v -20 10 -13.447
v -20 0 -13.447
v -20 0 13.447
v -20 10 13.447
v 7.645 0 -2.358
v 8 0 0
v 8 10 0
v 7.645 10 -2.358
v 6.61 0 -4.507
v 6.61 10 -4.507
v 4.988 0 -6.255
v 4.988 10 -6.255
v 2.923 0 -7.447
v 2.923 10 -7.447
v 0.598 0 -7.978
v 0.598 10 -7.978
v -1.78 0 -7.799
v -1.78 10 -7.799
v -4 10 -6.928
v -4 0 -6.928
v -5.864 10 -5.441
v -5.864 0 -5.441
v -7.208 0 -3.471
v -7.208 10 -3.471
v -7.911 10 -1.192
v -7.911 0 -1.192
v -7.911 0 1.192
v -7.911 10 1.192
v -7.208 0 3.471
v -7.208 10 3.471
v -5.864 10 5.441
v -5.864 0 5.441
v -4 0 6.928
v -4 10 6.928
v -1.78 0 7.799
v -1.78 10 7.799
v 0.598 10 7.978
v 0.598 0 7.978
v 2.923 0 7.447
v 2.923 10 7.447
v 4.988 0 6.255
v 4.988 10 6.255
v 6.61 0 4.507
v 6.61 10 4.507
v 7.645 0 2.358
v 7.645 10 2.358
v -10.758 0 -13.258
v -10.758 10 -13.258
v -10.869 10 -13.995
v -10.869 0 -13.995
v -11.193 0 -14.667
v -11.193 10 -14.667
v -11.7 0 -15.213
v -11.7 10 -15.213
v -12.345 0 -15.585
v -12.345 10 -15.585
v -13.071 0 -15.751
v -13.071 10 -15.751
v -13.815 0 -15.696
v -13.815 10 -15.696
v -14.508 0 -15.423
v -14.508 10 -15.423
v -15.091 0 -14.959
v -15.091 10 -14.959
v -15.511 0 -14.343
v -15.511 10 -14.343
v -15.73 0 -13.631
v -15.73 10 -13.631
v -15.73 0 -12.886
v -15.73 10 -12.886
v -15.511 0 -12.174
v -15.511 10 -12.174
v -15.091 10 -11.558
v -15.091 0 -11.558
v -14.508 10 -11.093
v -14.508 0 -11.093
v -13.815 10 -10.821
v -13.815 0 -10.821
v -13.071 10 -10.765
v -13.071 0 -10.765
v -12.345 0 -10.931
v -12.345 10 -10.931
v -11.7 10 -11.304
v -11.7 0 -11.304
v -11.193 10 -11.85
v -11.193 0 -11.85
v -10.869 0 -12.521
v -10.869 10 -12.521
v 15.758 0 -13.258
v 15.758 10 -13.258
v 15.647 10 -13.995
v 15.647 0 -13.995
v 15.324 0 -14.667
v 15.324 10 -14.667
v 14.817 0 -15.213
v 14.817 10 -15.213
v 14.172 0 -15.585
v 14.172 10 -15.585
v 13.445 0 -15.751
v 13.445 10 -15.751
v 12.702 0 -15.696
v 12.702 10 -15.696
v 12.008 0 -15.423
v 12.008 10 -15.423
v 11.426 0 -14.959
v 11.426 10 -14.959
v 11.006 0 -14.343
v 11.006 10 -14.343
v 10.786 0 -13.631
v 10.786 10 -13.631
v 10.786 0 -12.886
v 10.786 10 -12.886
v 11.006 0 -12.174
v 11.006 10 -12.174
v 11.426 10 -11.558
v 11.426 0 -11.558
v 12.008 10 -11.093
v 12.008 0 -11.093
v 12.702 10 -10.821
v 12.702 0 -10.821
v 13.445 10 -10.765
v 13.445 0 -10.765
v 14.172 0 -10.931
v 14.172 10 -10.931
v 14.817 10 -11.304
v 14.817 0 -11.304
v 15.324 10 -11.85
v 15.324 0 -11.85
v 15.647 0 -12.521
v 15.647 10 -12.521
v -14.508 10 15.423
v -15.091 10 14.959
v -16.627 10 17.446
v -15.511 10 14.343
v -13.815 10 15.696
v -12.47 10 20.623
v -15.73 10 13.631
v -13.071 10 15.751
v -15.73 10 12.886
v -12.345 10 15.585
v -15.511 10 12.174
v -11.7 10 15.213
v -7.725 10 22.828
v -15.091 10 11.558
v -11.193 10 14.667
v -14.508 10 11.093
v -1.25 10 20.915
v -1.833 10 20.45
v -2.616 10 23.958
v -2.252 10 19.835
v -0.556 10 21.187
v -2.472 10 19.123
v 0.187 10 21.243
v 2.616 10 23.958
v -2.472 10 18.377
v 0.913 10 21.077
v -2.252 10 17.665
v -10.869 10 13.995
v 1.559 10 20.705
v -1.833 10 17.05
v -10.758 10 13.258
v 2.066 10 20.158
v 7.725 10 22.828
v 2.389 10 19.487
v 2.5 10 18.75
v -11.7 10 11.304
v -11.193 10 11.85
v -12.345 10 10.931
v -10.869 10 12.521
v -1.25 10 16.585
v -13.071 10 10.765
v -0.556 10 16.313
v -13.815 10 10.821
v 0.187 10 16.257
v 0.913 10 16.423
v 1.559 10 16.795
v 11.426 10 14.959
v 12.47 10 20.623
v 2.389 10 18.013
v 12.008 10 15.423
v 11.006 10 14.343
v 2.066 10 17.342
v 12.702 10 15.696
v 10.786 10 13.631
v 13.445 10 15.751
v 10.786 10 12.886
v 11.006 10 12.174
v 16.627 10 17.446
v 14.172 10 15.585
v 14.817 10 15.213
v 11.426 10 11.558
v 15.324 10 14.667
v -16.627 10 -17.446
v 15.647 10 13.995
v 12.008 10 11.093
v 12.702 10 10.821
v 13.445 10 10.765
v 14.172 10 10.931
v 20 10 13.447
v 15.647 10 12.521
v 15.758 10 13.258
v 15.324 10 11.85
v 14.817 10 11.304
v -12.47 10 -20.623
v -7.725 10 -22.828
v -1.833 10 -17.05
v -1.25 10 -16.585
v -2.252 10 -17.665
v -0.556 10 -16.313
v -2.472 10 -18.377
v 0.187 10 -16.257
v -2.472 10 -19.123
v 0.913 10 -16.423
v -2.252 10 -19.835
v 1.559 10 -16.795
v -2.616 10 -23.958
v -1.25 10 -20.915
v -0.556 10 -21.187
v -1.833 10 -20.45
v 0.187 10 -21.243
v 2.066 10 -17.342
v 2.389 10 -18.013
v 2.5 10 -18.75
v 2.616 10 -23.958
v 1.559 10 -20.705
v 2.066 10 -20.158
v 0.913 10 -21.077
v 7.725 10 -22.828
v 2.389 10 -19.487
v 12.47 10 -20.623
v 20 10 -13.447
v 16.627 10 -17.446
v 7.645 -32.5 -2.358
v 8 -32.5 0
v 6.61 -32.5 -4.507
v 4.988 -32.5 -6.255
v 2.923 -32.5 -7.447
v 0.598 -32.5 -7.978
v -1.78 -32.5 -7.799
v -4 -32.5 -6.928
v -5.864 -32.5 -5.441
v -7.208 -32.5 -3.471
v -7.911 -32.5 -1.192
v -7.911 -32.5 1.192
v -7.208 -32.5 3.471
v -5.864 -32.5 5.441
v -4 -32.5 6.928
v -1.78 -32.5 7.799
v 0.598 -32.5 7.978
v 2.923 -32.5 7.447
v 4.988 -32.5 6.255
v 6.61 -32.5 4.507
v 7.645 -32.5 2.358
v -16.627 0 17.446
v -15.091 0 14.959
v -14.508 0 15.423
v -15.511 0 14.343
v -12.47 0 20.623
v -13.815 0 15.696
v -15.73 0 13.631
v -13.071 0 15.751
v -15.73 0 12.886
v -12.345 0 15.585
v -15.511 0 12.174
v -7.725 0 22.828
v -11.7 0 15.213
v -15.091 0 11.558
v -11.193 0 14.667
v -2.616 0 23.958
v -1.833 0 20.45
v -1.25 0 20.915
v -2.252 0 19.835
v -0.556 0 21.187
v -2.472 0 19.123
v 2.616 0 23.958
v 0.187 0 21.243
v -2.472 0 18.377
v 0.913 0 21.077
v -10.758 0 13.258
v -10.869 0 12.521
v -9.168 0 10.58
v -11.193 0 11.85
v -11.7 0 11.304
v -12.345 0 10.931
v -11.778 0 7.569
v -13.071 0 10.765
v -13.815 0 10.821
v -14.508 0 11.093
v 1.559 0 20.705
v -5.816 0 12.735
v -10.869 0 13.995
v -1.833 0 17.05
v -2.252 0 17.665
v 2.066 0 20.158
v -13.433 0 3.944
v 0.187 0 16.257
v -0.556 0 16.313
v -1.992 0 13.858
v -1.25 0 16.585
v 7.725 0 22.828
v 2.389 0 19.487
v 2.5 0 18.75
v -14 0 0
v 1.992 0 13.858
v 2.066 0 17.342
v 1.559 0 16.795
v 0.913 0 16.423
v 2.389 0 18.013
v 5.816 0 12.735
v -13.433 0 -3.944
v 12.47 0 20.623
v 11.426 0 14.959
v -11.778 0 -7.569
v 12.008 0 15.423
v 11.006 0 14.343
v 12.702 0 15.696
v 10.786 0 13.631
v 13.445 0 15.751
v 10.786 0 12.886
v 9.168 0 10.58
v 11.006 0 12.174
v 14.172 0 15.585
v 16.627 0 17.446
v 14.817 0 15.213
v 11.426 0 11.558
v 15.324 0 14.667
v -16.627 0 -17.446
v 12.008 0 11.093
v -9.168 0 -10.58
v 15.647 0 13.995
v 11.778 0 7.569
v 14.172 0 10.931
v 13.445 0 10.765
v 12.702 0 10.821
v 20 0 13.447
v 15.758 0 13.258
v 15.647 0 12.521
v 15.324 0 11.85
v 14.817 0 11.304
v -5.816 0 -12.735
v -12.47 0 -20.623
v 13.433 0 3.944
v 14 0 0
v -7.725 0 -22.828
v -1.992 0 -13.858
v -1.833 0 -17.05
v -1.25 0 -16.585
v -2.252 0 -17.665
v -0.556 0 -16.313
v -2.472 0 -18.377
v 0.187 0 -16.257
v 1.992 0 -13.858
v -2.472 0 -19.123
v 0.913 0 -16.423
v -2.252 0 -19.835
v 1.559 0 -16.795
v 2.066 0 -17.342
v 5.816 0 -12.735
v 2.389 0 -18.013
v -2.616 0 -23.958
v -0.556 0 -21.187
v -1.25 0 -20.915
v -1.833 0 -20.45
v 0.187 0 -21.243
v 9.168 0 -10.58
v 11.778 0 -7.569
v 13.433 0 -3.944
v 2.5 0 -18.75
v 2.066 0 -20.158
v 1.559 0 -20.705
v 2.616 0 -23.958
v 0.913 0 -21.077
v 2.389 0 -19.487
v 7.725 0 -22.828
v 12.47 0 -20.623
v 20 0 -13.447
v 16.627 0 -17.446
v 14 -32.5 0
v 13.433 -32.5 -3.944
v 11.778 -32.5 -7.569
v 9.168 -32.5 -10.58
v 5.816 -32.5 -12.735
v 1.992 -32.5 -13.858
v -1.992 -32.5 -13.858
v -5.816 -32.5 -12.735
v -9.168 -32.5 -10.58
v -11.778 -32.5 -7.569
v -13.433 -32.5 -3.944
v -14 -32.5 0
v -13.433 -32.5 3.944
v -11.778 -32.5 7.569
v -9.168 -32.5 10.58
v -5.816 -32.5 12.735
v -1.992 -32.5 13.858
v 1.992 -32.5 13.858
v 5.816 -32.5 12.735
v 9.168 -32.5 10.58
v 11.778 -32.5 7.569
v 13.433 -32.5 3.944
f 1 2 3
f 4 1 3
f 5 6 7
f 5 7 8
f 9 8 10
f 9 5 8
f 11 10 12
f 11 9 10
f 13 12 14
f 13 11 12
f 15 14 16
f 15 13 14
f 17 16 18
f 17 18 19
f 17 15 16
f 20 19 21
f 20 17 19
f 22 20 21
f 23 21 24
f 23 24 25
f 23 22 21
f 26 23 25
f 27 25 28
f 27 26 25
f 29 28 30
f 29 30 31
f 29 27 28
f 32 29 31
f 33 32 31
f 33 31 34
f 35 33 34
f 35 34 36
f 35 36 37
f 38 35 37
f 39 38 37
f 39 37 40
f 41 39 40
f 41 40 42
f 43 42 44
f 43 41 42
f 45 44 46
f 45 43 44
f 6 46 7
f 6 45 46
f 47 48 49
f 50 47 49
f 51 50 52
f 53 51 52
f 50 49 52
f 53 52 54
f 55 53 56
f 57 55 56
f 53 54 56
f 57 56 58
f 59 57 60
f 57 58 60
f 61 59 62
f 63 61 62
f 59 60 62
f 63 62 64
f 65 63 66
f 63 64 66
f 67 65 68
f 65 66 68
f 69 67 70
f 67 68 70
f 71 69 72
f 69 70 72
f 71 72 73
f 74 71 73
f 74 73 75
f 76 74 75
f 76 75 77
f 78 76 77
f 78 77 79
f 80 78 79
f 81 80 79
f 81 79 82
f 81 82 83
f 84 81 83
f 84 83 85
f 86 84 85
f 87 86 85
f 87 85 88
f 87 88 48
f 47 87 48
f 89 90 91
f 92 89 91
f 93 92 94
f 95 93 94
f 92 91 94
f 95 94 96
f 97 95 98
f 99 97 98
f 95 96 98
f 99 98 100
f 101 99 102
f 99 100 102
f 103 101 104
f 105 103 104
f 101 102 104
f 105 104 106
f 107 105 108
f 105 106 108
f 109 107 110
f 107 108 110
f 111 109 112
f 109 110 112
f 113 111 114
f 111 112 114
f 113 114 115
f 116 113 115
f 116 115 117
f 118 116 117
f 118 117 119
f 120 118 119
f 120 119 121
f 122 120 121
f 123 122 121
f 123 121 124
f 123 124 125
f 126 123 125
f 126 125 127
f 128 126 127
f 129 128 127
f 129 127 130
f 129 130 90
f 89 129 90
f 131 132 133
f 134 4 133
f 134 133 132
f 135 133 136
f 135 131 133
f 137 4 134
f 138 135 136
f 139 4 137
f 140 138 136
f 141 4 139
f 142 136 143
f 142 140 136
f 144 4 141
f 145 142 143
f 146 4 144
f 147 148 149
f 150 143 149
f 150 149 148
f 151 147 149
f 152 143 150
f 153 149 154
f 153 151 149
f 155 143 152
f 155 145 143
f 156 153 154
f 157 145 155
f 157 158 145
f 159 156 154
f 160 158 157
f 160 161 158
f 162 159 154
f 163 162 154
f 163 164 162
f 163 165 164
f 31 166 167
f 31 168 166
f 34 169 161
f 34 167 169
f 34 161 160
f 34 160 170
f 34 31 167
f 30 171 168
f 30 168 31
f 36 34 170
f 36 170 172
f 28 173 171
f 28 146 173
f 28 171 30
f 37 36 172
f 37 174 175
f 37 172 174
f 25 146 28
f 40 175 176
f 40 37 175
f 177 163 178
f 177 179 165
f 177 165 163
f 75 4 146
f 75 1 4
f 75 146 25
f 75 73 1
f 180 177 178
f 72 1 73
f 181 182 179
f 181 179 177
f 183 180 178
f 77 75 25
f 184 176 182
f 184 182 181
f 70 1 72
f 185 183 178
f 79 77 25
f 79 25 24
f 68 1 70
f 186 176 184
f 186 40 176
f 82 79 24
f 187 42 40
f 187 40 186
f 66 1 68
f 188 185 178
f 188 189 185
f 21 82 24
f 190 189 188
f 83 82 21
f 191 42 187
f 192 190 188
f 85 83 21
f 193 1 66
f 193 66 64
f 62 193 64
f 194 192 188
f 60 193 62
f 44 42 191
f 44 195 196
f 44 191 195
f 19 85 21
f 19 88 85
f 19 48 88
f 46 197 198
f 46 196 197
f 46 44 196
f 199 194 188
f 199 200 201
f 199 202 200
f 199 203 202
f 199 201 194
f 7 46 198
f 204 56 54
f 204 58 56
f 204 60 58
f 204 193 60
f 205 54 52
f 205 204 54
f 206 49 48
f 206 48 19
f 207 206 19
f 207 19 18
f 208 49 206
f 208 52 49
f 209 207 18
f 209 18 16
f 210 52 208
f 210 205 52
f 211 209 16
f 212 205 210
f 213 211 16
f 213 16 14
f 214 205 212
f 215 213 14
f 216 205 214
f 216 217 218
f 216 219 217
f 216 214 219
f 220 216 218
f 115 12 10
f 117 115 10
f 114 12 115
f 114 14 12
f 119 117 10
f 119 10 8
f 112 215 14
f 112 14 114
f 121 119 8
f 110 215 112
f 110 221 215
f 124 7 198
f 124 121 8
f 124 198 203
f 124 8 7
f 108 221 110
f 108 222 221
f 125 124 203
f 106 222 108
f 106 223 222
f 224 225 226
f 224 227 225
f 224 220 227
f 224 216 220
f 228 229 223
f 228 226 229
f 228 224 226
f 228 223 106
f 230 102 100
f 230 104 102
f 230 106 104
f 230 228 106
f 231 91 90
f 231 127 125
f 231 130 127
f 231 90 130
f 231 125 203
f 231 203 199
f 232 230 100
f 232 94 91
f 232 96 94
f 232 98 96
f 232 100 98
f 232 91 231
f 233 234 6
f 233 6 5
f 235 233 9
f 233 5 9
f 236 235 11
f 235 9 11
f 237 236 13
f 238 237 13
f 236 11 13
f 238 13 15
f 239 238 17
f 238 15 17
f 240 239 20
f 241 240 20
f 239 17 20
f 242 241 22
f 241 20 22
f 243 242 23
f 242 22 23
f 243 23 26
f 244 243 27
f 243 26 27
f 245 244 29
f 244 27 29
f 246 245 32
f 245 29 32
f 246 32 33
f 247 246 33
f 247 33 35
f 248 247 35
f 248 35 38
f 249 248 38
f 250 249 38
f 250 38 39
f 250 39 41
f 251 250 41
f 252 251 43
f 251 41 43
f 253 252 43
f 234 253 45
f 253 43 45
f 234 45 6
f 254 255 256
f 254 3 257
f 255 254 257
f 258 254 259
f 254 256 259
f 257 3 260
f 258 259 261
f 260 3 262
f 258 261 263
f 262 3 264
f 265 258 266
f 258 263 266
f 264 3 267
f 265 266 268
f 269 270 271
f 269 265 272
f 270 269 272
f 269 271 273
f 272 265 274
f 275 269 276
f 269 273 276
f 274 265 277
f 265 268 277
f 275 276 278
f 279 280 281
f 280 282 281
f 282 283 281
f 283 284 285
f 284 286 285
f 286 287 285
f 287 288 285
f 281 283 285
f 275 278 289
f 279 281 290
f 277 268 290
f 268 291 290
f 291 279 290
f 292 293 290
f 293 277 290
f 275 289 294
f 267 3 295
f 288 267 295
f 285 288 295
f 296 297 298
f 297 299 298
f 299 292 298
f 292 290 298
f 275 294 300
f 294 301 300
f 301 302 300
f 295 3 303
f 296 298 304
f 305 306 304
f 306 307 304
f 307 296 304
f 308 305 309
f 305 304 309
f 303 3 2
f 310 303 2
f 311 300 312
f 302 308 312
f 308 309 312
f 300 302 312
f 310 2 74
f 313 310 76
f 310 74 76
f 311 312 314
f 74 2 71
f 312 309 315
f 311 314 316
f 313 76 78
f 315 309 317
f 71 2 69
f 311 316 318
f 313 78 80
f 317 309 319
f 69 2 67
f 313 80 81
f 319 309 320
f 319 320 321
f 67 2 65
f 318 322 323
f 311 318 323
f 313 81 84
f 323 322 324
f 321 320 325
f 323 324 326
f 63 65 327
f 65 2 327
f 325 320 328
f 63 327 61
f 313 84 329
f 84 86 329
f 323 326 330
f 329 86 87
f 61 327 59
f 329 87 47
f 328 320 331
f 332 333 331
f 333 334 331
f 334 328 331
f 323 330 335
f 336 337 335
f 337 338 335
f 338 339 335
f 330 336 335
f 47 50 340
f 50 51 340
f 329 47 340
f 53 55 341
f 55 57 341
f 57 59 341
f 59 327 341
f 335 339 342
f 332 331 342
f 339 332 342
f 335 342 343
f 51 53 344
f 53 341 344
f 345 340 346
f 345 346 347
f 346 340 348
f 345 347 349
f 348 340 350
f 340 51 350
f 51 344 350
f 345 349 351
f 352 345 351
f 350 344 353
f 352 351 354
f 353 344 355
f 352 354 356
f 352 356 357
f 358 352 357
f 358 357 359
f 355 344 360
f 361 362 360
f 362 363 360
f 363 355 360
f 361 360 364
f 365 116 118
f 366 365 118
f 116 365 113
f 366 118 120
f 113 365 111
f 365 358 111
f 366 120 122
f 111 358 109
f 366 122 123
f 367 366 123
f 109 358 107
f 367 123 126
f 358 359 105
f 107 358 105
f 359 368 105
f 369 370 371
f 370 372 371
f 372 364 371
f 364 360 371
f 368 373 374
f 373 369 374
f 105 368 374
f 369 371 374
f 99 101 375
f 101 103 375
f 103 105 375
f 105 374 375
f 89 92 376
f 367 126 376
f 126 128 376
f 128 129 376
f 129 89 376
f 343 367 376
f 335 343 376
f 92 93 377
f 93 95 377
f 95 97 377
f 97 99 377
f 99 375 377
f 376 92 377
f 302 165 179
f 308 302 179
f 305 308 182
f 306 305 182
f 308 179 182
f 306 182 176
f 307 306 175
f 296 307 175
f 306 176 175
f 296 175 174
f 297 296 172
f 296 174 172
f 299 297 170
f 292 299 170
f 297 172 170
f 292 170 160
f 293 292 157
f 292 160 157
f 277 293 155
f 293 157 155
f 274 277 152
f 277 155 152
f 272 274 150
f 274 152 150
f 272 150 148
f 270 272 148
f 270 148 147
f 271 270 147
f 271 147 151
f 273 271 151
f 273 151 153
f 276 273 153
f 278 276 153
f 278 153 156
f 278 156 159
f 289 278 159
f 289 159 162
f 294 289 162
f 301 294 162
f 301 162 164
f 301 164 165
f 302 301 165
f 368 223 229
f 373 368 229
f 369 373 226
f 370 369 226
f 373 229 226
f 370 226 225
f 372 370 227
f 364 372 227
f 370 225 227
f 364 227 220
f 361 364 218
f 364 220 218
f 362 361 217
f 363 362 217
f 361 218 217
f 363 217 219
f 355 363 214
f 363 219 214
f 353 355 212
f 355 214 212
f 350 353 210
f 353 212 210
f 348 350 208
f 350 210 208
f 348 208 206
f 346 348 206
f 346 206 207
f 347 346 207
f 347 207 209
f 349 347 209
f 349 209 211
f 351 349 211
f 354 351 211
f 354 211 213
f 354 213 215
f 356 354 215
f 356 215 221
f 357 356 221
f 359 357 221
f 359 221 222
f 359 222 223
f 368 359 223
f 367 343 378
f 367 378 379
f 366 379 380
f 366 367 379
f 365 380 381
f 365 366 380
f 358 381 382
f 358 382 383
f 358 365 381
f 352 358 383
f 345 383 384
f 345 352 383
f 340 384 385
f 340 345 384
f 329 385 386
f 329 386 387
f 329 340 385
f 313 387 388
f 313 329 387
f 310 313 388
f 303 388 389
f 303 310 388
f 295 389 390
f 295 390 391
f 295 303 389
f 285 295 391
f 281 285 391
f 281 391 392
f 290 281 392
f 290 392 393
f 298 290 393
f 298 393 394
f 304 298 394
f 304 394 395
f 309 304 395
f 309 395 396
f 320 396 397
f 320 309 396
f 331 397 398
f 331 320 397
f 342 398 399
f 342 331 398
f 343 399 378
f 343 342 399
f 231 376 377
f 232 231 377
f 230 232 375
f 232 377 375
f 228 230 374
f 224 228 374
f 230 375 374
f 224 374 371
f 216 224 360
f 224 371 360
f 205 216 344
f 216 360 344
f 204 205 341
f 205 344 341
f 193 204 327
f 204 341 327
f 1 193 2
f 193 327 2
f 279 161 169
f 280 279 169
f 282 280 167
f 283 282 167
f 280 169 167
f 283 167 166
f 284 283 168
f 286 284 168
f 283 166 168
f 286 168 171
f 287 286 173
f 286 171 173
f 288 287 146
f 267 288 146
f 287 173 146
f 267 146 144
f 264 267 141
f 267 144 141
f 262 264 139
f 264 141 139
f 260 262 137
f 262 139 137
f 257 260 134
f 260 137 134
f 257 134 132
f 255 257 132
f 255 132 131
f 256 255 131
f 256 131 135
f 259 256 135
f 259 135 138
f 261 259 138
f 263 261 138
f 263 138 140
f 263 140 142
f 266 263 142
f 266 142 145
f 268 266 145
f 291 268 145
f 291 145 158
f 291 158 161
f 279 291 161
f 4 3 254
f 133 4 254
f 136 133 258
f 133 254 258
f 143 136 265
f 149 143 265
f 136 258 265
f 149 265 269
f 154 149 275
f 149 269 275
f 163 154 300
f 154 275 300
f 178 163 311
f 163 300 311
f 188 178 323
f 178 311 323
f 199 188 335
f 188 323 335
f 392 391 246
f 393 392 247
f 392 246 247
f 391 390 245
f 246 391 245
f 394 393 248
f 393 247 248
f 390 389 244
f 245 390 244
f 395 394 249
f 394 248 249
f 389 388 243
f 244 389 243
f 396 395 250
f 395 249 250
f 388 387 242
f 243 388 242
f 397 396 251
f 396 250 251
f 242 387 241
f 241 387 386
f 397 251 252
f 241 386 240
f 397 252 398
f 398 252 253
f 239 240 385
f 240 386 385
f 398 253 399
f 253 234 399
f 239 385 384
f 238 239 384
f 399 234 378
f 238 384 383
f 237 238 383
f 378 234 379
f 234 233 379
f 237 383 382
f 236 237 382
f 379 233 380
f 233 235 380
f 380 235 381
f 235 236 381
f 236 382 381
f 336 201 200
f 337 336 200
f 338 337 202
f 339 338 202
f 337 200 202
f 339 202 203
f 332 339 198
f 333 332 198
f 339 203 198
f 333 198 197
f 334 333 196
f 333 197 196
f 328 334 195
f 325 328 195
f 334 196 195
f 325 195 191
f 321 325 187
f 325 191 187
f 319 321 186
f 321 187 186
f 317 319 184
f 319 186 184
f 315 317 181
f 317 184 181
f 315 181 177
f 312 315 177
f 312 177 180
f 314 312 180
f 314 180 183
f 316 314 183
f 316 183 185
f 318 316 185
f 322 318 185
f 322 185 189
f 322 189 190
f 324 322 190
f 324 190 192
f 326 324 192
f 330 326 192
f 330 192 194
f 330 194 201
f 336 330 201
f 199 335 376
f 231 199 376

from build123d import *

# Parameters (mm, degrees)
SKETCH1_R           = 8
BOSS_EXTRUDE1_DEPTH = 10
BOSS_EXTRUDE2_START = -32.5
SKETCH1_3_R         = 14
SKETCH1_3_R_2       = 8
BOSS_EXTRUDE2_DEPTH = 32.5
SKETCH2_R           = 2.5
CUT_EXTRUDE1_DEPTH  = 32.5


with BuildPart() as part:
    # Sketch1 → Boss-Extrude1 (new body)
    with BuildSketch(Plane(origin=(0, 0, 0), x_dir=(1, 0, 0), z_dir=(0, 1, 0))):
        with BuildLine():
            ThreePointArc((20, 13.446560899), (0, 24.1), (-20, 13.446560899))
            Line((-20, 13.446560899), (-20, -13.446560899))
            ThreePointArc((-20, -13.446560899), (0, -24.1), (20, -13.446560899))
            Line((20, -13.446560899), (20, 13.446560899))
        make_face()
        Circle(SKETCH1_R, mode=Mode.SUBTRACT)
    extrude(amount=BOSS_EXTRUDE1_DEPTH)

    # Sketch1<3> → Boss-Extrude2 (add)
    with BuildSketch(Plane(origin=(0, 0, 0), x_dir=(1, 0, 0), z_dir=(0, 1, 0)).offset(BOSS_EXTRUDE2_START)):
        Circle(SKETCH1_3_R)
        Circle(SKETCH1_3_R_2, mode=Mode.SUBTRACT)
    extrude(amount=BOSS_EXTRUDE2_DEPTH)

    # Sketch2 → Cut-Extrude1 (cut)
    with BuildSketch(Plane(origin=(0, 10, 0), x_dir=(1, 0, 0), z_dir=(0, 1, 0))):
        with Locations((0, -18.75)):
            Circle(SKETCH2_R)
        with Locations((-13.258252147, -13.258252147)):
            Circle(SKETCH2_R)
        with Locations((-13.258252147, 13.258252147)):
            Circle(SKETCH2_R)
        with Locations((0, 18.75)):
            Circle(SKETCH2_R)
        with Locations((13.258252147, 13.258252147)):
            Circle(SKETCH2_R)
        with Locations((13.258252147, -13.258252147)):
            Circle(SKETCH2_R)
    extrude(amount=-CUT_EXTRUDE1_DEPTH, mode=Mode.SUBTRACT)


solid = part.part
